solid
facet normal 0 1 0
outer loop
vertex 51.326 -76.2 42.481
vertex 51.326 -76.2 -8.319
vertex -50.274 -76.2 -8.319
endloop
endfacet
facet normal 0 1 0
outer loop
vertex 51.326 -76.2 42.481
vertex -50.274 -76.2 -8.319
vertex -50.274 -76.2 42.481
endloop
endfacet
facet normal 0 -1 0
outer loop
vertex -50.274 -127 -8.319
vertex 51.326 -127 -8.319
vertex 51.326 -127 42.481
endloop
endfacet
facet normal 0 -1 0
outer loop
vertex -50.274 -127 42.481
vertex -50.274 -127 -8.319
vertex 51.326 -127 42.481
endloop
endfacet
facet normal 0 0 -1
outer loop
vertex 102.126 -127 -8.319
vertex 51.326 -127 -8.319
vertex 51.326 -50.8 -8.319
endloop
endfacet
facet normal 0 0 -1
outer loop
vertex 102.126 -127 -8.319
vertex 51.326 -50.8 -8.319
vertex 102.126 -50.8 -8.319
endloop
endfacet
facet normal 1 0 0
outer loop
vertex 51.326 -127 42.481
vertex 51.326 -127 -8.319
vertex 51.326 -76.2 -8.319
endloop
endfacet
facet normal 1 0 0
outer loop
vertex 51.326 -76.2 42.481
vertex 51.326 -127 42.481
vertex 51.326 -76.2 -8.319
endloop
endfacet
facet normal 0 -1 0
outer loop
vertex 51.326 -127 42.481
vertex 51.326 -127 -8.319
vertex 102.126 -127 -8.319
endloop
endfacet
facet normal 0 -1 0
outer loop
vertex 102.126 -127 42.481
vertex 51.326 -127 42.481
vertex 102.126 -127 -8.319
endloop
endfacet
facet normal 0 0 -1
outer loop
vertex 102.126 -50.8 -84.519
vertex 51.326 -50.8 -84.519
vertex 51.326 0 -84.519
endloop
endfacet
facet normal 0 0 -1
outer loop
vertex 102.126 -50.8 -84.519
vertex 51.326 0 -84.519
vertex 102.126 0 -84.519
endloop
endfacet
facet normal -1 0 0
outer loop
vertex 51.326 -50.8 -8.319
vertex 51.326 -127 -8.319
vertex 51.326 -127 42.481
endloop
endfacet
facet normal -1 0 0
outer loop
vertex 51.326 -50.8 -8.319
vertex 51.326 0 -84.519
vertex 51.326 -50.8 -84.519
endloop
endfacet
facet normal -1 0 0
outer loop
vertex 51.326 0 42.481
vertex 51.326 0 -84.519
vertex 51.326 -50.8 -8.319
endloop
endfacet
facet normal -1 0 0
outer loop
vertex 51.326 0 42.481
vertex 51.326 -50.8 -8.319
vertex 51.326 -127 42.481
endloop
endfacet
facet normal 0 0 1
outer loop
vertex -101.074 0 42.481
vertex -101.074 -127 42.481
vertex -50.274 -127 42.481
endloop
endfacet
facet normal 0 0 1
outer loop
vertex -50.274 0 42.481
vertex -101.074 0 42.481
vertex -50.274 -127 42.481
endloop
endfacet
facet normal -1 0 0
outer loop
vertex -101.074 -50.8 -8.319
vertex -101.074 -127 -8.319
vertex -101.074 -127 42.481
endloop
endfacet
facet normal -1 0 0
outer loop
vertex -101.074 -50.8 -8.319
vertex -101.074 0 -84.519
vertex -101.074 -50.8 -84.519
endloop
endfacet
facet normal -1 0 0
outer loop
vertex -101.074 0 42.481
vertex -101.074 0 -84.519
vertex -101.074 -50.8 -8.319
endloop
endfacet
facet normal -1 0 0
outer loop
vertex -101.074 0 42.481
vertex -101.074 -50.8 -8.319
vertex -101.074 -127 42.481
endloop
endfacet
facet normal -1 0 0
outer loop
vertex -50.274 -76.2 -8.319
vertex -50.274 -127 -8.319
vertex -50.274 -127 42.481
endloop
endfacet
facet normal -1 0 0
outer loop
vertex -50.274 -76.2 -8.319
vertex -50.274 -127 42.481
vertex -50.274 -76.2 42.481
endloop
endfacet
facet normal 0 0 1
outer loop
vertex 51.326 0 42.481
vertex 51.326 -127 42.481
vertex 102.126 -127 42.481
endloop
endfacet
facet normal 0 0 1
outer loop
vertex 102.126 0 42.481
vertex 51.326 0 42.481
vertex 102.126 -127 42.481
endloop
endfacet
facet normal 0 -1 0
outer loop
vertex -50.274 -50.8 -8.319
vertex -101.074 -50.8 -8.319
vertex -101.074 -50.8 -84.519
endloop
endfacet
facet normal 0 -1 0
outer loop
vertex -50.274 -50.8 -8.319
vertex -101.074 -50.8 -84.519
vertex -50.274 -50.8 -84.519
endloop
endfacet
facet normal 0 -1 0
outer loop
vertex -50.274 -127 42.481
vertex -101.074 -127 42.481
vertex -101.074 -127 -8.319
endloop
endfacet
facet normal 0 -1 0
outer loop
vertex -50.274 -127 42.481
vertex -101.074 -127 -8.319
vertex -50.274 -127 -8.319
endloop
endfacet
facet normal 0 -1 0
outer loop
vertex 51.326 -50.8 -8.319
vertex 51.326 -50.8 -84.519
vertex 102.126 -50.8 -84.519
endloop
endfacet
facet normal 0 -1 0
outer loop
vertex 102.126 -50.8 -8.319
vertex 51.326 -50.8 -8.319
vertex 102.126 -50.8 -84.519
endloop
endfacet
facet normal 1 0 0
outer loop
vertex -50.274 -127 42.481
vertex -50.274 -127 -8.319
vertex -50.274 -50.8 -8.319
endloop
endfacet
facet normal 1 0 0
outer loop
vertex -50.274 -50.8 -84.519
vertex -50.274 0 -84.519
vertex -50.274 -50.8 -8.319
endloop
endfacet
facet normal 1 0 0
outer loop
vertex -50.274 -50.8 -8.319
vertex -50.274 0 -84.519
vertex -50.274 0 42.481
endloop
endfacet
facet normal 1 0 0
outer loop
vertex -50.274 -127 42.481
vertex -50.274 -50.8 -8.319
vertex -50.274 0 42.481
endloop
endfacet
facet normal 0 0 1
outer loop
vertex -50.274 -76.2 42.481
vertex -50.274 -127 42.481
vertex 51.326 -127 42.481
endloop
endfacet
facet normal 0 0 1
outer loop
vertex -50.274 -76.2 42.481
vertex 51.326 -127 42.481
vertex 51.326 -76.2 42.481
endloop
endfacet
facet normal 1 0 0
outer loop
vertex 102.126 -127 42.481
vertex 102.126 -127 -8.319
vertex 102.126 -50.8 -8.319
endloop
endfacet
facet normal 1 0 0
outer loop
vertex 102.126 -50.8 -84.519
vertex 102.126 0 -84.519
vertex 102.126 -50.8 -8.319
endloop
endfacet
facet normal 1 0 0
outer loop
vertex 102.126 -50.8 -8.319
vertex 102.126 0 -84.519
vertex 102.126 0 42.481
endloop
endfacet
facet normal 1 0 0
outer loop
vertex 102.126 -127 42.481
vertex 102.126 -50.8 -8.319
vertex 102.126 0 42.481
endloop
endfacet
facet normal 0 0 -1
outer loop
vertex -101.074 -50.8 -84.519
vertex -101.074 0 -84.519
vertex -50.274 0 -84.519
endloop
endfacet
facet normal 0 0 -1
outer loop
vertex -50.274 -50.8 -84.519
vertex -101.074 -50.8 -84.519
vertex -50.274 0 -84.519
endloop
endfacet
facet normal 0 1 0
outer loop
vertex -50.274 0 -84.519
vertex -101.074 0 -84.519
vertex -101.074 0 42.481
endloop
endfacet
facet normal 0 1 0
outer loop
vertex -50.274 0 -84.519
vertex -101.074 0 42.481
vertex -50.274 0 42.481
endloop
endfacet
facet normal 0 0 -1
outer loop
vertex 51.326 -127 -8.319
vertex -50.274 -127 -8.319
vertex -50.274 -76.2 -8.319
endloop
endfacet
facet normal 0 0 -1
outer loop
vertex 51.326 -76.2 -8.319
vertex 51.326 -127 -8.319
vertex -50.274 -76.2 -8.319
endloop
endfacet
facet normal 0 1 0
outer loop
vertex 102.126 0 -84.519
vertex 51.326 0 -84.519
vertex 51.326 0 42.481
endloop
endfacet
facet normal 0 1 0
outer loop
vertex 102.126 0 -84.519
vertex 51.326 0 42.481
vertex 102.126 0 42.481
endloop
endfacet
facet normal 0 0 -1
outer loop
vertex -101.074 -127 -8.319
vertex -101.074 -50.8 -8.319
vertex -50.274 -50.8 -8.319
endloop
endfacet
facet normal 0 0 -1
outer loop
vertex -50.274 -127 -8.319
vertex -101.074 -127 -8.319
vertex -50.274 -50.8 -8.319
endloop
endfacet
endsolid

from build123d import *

# Parameters (mm, degrees)
F0_W     = 50.8
F0_H     = 127
F1_DEPTH = 50.8
F2_W     = 50.8
F2_H     = 50.8
F3_DEPTH = 76.2
F4_W     = 50.8
F4_H     = 50.8
F5_DEPTH = 76.2
F6_W     = 50.8
F6_H     = 50.8
F7_DEPTH = 101.6


with BuildPart() as f1:
    # F0 (on Front) → F1 (new body)
    with BuildSketch(Plane.XZ):
        with Locations((-75.674206, -21.018796)):
            Rectangle(F0_W, F0_H)
        with Locations((76.725794, -21.018796)):
            Rectangle(F0_W, F0_H)
    extrude(amount=F1_DEPTH)

    # F2 (on face) → F3 (join)
    with BuildSketch(Plane.XZ.offset(50.8)):
        with Locations((76.725794, 17.081204)):
            Rectangle(F2_W, F2_H)
    extrude(amount=F3_DEPTH)

    # F4 (on face) → F5 (join)
    with BuildSketch(Plane.XZ.offset(50.8)):
        with Locations((-75.674206, 17.081204)):
            Rectangle(F4_W, F4_H)
    extrude(amount=F5_DEPTH)


with BuildPart() as f7:
    # F6 (on face) → F7 (new body)
    with BuildSketch(Plane.YZ.offset(-50.274206)):
        with Locations((-101.6, 17.081204)):
            Rectangle(F6_W, F6_H)
    extrude(amount=F7_DEPTH)


solid = Compound([f1.part, f7.part])
